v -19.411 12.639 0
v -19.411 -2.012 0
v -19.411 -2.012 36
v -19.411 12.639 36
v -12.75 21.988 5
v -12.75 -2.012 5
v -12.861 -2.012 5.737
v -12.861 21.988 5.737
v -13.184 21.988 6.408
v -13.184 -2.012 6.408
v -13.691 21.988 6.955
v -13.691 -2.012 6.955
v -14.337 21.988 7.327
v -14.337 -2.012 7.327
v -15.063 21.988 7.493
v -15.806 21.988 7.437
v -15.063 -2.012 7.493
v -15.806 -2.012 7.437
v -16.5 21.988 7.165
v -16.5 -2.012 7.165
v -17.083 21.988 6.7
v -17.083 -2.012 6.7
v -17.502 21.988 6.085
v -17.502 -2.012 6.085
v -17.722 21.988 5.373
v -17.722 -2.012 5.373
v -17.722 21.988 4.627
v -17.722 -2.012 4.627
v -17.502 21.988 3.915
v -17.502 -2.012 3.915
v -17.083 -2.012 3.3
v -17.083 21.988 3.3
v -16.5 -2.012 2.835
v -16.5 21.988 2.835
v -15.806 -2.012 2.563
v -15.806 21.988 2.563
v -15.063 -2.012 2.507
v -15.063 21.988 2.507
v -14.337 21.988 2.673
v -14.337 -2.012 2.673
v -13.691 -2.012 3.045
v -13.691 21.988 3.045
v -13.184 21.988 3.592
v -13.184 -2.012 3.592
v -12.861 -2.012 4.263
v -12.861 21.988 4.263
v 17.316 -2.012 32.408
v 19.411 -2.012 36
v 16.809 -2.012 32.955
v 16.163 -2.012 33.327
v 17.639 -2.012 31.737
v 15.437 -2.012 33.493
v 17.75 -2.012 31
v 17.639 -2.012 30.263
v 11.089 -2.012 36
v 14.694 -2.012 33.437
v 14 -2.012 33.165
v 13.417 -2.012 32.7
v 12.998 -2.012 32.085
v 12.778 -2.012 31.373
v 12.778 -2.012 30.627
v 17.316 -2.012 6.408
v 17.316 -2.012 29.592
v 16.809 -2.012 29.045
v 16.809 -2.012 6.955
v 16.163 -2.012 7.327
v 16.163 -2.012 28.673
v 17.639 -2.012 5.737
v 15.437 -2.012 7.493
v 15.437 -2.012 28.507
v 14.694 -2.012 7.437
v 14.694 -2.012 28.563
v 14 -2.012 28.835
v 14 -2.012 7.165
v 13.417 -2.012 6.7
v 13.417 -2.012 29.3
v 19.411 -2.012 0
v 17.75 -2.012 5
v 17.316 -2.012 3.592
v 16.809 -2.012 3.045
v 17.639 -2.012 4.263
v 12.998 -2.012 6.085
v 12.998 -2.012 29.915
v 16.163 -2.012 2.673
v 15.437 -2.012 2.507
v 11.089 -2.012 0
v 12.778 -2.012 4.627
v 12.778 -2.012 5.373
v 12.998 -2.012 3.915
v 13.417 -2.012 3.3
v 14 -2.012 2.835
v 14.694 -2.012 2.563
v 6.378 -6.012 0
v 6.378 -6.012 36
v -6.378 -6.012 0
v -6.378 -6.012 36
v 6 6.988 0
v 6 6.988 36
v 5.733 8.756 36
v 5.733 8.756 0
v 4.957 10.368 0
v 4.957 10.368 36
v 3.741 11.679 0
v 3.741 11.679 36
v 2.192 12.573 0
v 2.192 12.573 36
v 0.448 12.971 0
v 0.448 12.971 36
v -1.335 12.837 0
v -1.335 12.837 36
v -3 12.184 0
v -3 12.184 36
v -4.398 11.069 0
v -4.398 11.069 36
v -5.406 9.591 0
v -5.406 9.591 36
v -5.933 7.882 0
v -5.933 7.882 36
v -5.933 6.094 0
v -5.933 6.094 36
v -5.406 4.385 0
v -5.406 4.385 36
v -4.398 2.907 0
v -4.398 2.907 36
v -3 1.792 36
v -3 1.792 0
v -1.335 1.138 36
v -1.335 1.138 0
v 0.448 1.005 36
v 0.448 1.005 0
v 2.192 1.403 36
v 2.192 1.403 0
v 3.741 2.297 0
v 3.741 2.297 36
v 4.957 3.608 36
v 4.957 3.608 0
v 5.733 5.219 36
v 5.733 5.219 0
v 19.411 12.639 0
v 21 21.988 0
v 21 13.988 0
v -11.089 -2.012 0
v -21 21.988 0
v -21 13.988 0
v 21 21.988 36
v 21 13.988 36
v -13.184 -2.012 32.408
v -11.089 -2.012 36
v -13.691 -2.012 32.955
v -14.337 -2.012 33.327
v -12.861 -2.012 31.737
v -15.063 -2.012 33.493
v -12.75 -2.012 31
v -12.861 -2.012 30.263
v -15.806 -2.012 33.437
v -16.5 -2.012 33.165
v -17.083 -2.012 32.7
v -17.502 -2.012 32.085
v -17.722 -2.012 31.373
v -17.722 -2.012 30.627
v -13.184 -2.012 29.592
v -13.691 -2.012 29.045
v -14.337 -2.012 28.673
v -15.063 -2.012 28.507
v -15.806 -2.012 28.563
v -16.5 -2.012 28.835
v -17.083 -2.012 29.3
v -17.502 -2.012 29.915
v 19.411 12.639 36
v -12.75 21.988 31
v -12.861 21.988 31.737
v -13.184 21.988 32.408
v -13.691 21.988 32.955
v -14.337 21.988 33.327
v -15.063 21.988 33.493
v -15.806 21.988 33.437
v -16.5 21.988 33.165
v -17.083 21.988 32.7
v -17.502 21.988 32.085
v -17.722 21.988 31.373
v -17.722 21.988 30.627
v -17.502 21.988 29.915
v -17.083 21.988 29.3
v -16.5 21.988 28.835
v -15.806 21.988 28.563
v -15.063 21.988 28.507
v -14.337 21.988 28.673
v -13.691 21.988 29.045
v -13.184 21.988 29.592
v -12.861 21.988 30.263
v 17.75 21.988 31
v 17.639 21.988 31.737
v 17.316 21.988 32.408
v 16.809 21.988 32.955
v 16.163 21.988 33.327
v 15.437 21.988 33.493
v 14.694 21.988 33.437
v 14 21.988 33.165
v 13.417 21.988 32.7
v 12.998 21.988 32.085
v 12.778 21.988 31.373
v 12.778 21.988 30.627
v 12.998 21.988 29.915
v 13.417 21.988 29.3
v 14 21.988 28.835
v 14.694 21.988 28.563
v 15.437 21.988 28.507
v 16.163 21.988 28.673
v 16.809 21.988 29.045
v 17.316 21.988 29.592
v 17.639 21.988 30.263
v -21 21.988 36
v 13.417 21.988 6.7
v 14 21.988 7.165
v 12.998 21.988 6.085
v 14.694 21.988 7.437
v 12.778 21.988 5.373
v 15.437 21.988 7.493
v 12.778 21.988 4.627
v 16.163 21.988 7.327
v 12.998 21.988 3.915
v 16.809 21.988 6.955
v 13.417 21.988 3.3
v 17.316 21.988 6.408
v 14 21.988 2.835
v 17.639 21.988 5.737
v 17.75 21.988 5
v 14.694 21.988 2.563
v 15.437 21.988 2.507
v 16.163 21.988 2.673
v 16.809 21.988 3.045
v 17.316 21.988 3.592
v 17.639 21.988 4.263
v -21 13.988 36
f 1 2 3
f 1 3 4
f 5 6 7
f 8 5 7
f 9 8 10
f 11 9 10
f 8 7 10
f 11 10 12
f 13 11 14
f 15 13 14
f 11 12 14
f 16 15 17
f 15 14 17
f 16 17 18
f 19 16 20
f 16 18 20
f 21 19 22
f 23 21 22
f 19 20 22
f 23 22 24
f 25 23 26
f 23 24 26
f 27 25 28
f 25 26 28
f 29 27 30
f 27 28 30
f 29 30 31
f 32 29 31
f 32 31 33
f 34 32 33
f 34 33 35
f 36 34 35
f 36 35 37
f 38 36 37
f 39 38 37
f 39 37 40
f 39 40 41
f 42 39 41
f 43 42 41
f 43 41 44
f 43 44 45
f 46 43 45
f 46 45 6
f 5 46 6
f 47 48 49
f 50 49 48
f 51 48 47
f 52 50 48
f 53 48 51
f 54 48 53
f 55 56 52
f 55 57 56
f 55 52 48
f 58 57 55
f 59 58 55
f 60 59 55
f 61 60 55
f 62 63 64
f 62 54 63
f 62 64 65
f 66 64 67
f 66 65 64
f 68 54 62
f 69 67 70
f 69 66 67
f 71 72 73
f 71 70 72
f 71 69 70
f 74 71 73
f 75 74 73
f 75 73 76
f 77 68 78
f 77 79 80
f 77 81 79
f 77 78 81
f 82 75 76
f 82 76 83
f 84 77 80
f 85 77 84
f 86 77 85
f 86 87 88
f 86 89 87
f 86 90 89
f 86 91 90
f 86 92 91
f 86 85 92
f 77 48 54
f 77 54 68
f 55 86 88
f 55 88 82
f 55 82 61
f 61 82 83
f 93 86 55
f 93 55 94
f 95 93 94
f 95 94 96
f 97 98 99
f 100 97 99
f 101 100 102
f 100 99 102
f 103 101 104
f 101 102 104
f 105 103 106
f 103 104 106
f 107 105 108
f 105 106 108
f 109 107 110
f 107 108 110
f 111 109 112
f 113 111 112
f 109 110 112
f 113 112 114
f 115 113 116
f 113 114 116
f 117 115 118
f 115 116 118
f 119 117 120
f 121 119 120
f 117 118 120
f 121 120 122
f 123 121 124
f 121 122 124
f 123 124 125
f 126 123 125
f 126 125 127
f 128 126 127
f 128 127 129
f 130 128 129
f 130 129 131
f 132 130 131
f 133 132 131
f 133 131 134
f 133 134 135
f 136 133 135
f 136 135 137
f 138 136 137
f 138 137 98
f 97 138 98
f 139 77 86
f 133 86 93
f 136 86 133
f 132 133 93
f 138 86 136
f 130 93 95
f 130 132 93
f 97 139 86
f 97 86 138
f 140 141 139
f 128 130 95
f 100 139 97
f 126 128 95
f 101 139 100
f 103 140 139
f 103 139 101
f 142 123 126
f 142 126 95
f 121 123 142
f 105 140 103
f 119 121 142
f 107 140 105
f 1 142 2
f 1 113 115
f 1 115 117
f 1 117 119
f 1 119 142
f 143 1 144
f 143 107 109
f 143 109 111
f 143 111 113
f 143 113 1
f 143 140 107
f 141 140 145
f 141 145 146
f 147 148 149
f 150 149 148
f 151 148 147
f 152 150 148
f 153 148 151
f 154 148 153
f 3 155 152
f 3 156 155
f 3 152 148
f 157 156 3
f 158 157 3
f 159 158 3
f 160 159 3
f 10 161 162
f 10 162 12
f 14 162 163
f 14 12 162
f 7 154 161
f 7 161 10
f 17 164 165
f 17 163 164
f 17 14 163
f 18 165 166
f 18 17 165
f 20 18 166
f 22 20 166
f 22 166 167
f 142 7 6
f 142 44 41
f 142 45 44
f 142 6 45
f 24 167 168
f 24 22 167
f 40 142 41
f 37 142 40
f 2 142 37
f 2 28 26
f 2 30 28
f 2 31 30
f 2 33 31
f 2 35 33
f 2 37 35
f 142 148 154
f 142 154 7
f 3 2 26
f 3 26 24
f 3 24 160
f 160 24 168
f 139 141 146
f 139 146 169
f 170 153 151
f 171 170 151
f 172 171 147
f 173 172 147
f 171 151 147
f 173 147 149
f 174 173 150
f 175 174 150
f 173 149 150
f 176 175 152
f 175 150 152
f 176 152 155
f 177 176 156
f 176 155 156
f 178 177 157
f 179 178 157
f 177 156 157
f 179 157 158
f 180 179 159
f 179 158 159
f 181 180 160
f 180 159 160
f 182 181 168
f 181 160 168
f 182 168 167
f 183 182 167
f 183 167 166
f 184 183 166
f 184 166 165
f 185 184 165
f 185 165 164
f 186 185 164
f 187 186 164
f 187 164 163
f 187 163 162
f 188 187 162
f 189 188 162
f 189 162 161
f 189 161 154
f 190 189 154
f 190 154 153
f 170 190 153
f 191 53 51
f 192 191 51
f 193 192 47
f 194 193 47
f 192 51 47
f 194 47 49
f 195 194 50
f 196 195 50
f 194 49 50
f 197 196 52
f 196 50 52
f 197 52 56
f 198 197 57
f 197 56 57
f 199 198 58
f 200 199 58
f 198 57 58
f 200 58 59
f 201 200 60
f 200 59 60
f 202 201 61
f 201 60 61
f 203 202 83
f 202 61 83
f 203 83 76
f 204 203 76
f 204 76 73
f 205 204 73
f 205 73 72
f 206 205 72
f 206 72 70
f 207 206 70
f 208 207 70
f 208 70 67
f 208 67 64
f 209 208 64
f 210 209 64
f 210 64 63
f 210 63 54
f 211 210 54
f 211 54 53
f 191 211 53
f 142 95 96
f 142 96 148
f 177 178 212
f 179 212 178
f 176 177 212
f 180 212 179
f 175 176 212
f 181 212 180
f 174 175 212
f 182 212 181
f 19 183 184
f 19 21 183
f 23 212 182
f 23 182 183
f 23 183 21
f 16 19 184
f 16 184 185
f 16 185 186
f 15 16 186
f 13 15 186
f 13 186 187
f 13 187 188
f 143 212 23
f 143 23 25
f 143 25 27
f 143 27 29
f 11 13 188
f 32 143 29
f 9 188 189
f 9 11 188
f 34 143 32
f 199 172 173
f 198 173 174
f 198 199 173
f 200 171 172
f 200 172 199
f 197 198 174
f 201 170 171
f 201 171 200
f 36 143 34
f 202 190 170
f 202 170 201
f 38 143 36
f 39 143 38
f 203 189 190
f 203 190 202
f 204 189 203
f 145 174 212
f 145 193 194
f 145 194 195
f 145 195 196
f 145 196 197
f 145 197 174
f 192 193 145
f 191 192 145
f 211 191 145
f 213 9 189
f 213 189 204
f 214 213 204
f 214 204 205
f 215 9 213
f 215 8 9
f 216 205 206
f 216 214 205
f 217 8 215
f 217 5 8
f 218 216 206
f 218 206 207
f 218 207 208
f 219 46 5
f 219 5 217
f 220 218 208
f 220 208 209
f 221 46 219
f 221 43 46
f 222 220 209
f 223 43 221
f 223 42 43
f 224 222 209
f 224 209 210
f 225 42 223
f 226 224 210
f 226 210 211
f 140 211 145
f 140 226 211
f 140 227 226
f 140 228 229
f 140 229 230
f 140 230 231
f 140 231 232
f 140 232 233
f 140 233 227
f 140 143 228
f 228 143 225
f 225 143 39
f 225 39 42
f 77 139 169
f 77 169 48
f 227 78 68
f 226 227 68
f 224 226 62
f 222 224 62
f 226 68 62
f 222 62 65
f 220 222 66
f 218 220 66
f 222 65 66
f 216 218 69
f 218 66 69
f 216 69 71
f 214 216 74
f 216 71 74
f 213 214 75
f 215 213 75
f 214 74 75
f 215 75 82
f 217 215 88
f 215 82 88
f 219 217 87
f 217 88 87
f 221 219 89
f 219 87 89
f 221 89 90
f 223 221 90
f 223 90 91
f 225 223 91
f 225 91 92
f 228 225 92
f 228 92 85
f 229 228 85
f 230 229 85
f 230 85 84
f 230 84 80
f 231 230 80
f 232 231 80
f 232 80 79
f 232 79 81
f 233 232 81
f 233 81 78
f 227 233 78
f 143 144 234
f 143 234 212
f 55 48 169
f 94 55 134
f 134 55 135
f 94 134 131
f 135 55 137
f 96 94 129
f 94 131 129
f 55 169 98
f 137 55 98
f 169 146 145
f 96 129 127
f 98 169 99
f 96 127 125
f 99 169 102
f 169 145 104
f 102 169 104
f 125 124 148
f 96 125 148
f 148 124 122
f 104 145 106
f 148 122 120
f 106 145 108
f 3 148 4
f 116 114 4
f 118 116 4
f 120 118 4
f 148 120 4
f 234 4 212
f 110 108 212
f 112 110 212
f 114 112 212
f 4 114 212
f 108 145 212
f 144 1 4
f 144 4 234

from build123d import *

# Parameters (mm, degrees)
RESSALTO_EXTRUS_O1_DEPTH = 36
ESBO_O2_R                = 6
CORTE_EXTRUS_O1_DEPTH    = 37
ESBO_O4_R                = 2.5
CORTE_EXTRUS_O2_DEPTH    = 29


with BuildPart() as part:
    # Esboço1 → Ressalto-extrusão1 (new body)
    with BuildSketch(Plane.XY):
        Polygon((6.3777561, -6.012123693), (-6.3777561, -6.012123693), (-11.089070113, -2.012123693), (-19.410929887, -2.012123693), (-19.410929887, 12.63872394), (-21, 13.987876307), (-21, 21.987876307), (21, 21.987876307), (21, 13.987876307), (19.410929887, 12.63872394), (19.410929887, -2.012123693), (11.089070113, -2.012123693), align=None)
    extrude(amount=RESSALTO_EXTRUS_O1_DEPTH)

    # Esboço2 → Corte-extrusão1 (cut, through all)
    with BuildSketch(Plane.XY.offset(36)):
        with Locations((0, 6.987876307)):
            Circle(ESBO_O2_R)
    extrude(amount=-CORTE_EXTRUS_O1_DEPTH, mode=Mode.SUBTRACT)

    # Esboço4 → Corte-extrusão2 (cut, through all)
    with BuildSketch(Plane.XZ.offset(6.012123693)):
        with Locations((-15.25, 5)):
            Circle(ESBO_O4_R)
        with Locations((-15.25, 31)):
            Circle(ESBO_O4_R)
        with Locations((15.25, 5)):
            Circle(ESBO_O4_R)
        with Locations((15.25, 31)):
            Circle(ESBO_O4_R)
    extrude(amount=-CORTE_EXTRUS_O2_DEPTH, mode=Mode.SUBTRACT)


solid = part.part
